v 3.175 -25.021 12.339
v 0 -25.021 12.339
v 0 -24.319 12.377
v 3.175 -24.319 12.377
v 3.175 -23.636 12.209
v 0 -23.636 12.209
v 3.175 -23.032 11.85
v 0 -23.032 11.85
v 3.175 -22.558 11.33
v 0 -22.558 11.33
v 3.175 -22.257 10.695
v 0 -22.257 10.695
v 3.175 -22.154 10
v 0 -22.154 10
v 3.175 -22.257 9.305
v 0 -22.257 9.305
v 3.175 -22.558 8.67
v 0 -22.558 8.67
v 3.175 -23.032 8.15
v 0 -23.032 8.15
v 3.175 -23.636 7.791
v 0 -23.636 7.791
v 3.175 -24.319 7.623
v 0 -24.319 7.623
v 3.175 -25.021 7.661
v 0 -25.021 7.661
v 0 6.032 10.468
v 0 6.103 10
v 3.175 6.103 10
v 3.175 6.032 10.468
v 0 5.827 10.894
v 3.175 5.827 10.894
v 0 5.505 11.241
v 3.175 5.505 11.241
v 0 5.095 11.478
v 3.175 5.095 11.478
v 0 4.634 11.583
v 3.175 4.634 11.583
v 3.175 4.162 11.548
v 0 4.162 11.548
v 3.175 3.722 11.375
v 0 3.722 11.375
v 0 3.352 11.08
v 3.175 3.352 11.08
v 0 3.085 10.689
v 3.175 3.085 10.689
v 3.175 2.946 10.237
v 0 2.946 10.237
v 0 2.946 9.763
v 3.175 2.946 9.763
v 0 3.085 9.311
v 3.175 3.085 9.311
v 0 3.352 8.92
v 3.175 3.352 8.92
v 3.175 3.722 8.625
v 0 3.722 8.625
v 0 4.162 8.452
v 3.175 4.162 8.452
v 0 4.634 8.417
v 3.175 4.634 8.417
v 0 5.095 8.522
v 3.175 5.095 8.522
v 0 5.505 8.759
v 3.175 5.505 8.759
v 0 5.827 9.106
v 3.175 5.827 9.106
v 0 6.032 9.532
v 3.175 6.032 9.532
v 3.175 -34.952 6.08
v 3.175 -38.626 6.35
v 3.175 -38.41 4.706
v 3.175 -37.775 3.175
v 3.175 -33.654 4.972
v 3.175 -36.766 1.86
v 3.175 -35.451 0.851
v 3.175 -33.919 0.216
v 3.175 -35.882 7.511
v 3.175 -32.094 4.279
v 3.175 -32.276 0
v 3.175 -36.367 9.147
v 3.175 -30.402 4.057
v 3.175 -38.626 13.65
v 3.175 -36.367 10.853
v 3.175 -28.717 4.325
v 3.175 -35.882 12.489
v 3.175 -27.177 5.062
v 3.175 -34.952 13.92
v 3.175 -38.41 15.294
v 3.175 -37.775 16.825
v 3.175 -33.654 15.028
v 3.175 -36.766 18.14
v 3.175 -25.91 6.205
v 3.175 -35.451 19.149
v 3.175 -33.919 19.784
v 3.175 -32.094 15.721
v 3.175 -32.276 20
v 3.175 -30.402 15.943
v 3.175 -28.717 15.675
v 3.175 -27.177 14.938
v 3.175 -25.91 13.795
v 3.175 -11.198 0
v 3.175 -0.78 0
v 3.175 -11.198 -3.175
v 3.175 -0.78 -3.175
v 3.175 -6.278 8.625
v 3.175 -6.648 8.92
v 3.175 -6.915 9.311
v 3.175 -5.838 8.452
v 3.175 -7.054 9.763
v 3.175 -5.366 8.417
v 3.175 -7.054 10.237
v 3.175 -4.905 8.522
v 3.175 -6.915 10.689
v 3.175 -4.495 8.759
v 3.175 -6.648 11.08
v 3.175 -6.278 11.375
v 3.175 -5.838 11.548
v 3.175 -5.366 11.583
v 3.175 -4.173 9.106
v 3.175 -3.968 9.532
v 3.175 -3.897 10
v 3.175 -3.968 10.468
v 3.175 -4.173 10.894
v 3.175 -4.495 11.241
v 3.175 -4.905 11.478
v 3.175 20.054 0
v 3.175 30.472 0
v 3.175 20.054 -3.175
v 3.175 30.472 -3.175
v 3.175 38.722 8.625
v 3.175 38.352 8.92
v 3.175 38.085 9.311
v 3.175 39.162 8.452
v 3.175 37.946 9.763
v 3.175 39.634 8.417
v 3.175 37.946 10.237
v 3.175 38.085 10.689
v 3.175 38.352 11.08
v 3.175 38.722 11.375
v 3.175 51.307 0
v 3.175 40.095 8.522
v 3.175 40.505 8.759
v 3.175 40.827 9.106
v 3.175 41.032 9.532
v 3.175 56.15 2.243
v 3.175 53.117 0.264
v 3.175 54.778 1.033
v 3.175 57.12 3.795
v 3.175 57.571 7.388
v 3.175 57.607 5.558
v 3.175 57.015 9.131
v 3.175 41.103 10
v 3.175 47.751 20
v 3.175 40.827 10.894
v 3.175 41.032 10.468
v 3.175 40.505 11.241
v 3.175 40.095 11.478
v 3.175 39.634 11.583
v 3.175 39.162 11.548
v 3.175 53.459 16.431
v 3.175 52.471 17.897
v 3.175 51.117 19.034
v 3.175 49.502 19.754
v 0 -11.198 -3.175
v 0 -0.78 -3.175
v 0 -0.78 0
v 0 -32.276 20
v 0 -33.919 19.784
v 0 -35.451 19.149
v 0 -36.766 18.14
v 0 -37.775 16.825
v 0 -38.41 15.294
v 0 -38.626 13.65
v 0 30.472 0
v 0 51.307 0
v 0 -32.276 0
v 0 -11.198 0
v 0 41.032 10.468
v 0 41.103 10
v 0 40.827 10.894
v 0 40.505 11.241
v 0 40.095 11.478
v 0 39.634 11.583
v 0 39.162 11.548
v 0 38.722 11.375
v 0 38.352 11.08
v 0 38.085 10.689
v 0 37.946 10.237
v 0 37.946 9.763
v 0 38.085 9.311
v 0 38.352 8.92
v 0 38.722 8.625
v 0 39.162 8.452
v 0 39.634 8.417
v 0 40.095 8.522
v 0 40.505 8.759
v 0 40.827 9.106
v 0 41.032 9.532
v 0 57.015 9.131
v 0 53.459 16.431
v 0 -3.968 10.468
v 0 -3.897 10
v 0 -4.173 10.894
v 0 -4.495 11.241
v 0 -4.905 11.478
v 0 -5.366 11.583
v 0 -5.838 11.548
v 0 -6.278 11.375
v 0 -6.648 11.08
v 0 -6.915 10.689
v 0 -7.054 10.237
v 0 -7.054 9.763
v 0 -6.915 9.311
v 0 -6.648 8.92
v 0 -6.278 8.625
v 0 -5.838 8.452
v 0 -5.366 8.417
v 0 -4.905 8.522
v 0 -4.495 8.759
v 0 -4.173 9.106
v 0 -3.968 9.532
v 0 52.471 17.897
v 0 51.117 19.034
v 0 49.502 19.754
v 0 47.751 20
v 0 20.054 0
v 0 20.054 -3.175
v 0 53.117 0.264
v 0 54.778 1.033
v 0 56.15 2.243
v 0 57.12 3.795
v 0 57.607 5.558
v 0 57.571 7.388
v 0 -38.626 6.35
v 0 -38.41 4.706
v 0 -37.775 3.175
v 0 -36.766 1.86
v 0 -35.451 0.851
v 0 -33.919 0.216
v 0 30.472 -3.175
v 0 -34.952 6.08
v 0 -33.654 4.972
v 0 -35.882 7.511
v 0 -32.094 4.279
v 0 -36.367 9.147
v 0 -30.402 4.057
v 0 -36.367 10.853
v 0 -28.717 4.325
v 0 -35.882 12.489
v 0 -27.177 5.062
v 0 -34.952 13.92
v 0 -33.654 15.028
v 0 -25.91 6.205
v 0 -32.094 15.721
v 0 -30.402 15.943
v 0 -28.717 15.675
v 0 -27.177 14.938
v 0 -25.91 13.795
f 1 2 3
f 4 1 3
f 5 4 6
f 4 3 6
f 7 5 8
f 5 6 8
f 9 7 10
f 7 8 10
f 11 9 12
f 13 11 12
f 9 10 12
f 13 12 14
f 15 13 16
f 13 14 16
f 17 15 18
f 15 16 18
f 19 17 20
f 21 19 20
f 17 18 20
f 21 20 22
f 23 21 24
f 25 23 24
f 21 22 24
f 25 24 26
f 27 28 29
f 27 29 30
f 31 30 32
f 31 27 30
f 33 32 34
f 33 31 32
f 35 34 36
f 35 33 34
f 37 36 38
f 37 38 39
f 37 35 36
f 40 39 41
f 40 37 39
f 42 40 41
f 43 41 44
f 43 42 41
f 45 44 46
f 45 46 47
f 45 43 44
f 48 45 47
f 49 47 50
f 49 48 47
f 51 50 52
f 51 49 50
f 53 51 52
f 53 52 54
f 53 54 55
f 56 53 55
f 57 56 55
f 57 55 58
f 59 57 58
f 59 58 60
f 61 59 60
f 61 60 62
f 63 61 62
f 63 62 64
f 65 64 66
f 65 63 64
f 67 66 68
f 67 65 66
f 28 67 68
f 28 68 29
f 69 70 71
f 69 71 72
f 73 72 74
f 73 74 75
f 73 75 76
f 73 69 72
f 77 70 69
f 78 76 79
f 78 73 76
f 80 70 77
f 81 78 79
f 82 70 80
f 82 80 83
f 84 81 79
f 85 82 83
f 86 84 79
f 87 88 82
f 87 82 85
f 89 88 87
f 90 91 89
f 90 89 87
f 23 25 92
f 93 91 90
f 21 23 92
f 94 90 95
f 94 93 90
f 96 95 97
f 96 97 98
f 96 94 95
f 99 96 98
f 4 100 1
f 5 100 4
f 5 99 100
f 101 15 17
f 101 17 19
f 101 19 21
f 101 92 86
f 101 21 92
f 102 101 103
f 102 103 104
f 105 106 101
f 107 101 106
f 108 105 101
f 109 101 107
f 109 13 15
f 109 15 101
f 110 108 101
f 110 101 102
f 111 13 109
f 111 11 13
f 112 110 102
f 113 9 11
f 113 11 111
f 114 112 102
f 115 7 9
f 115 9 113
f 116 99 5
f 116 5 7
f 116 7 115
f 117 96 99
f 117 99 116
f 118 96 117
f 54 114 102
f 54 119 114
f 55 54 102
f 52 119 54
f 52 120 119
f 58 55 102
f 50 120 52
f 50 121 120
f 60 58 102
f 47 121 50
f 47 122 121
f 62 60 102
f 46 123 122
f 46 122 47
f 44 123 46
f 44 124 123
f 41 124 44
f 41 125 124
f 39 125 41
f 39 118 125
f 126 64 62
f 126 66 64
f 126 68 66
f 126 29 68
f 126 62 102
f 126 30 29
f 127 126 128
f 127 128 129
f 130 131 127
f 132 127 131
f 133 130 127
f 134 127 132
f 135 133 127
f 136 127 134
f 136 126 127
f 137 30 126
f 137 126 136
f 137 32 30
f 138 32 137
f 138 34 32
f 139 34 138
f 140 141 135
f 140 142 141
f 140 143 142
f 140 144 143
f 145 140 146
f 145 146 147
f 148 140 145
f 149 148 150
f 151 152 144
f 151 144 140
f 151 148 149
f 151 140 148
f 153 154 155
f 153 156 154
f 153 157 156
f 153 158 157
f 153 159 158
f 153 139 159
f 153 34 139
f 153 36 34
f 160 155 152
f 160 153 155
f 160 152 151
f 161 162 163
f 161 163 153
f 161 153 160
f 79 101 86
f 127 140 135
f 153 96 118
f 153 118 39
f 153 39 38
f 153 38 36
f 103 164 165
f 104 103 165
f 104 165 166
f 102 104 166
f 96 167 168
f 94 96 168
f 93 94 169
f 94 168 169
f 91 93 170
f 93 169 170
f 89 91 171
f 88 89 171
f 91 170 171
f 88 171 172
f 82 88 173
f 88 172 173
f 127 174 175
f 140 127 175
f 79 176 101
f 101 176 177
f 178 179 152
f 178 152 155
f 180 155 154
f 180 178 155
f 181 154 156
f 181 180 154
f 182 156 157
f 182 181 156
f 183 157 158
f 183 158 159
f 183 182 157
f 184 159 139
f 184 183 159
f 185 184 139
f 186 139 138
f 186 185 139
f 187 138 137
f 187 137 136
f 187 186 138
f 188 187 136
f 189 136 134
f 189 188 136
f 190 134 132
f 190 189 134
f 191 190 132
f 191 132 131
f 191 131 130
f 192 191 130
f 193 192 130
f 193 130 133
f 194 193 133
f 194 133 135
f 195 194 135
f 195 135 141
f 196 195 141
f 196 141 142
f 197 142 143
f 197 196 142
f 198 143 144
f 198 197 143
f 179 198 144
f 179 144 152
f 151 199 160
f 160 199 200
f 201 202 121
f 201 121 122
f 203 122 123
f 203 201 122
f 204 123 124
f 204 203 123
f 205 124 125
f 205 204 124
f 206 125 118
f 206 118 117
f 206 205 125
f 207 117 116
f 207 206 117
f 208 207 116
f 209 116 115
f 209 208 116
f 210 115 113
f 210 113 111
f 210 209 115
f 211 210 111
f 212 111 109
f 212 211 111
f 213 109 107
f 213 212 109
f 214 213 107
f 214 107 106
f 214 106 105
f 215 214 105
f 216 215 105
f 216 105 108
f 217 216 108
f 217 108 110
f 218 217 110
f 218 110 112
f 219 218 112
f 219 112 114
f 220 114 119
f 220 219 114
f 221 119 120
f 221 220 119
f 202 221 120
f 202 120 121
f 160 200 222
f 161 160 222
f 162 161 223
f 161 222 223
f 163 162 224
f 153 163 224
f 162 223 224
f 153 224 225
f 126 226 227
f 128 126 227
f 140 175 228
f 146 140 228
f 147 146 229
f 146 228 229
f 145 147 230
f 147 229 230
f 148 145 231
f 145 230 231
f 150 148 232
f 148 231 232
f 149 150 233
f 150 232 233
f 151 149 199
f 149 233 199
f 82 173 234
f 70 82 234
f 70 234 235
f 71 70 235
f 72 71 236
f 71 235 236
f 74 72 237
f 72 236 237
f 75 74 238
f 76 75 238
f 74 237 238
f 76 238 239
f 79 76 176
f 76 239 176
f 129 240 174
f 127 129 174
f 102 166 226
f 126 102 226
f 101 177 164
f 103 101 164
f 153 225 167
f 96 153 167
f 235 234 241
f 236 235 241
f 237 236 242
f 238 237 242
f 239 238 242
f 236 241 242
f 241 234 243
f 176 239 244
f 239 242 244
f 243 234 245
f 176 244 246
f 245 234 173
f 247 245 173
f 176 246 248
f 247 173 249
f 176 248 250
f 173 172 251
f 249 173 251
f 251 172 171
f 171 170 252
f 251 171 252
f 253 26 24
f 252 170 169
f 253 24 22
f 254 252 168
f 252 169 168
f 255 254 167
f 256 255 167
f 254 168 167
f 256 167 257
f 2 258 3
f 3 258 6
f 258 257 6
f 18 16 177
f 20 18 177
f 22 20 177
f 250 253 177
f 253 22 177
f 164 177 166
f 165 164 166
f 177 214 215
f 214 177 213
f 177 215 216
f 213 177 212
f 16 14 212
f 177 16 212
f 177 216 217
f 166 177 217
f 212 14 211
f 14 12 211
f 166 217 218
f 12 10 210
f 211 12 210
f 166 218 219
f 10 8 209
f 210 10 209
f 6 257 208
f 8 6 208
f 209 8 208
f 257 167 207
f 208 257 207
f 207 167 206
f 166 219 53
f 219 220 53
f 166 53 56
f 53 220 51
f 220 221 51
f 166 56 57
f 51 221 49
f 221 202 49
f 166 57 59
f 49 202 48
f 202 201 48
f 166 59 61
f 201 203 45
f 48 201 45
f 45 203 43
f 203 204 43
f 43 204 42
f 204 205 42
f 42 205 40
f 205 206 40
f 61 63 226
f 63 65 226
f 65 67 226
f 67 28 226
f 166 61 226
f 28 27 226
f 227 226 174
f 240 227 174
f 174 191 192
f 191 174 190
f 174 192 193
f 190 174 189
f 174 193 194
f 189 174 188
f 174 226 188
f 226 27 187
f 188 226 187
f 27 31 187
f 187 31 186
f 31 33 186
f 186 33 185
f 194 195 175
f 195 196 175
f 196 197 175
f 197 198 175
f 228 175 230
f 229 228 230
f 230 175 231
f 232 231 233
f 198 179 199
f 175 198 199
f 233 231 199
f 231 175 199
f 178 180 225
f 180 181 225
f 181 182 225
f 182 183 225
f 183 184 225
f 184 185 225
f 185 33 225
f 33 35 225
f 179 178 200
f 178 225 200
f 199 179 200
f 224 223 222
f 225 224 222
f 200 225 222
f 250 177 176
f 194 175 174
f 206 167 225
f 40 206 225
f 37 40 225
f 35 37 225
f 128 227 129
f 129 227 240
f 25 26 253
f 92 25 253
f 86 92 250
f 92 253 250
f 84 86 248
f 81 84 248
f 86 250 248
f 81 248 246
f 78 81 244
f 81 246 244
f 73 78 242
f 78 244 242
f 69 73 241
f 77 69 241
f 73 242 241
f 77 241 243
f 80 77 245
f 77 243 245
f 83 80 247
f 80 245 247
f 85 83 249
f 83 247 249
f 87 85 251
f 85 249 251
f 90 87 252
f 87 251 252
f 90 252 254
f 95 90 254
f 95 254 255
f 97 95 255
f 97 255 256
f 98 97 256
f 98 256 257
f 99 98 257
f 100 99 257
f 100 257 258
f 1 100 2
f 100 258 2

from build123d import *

# Parameters (mm, degrees)
F0_R     = 1.5875
F1_DEPTH = 3.175


with BuildPart() as f1:
    # F0 (on Right) → F1 (new body)
    with BuildSketch(Plane.YZ):
        with BuildLine():
            ThreePointArc((-38.625983, 6.35), (-36.766111, 1.859872), (-32.275983, 0))
            Line((-32.275983, 0), (-32.032519, 0))
            Line((-32.032519, 0), (-11.197744, 0))
            Line((-11.197744, 0), (-11.197744, -3.175))
            Line((-11.197744, -3.175), (-0.780357, -3.175))
            Line((-0.780357, -3.175), (-0.780357, 0))
            Line((-0.780357, 0), (20.054419, 0))
            Line((20.054419, 0), (20.054419, -3.175))
            Line((20.054419, -3.175), (30.471806, -3.175))
            Line((30.471806, -3.175), (30.471806, 0))
            Line((30.471806, 0), (51.306581, 0))
            ThreePointArc((51.306581, 0), (56.690855, 2.983682), (57.015299, 9.130835))
            Line((57.015299, 9.130835), (53.459318, 16.430835))
            ThreePointArc((53.459318, 16.430835), (51.116919, 19.034273), (47.7506, 20))
            Line((47.7506, 20), (-28.720002, 20))
            Line((-28.720002, 20), (-32.275983, 20))
            ThreePointArc((-32.275983, 20), (-36.766111, 18.140128), (-38.625983, 13.65))
            Line((-38.625983, 13.65), (-38.625983, 6.35))
        make_face()
        with BuildLine():
            ThreePointArc((-25.020661, 7.661057), (-36.428301, 10), (-25.020661, 12.338943))
            ThreePointArc((-25.020661, 12.338943), (-22.153501, 10), (-25.020661, 7.661057))
        make_face(mode=Mode.SUBTRACT)
        with Locations((-5.484701, 10)):
            Circle(F0_R, mode=Mode.SUBTRACT)
        with Locations((4.515299, 10)):
            Circle(F0_R, mode=Mode.SUBTRACT)
        with Locations((39.515299, 10)):
            Circle(F0_R, mode=Mode.SUBTRACT)
    extrude(amount=F1_DEPTH)


solid = f1.part
